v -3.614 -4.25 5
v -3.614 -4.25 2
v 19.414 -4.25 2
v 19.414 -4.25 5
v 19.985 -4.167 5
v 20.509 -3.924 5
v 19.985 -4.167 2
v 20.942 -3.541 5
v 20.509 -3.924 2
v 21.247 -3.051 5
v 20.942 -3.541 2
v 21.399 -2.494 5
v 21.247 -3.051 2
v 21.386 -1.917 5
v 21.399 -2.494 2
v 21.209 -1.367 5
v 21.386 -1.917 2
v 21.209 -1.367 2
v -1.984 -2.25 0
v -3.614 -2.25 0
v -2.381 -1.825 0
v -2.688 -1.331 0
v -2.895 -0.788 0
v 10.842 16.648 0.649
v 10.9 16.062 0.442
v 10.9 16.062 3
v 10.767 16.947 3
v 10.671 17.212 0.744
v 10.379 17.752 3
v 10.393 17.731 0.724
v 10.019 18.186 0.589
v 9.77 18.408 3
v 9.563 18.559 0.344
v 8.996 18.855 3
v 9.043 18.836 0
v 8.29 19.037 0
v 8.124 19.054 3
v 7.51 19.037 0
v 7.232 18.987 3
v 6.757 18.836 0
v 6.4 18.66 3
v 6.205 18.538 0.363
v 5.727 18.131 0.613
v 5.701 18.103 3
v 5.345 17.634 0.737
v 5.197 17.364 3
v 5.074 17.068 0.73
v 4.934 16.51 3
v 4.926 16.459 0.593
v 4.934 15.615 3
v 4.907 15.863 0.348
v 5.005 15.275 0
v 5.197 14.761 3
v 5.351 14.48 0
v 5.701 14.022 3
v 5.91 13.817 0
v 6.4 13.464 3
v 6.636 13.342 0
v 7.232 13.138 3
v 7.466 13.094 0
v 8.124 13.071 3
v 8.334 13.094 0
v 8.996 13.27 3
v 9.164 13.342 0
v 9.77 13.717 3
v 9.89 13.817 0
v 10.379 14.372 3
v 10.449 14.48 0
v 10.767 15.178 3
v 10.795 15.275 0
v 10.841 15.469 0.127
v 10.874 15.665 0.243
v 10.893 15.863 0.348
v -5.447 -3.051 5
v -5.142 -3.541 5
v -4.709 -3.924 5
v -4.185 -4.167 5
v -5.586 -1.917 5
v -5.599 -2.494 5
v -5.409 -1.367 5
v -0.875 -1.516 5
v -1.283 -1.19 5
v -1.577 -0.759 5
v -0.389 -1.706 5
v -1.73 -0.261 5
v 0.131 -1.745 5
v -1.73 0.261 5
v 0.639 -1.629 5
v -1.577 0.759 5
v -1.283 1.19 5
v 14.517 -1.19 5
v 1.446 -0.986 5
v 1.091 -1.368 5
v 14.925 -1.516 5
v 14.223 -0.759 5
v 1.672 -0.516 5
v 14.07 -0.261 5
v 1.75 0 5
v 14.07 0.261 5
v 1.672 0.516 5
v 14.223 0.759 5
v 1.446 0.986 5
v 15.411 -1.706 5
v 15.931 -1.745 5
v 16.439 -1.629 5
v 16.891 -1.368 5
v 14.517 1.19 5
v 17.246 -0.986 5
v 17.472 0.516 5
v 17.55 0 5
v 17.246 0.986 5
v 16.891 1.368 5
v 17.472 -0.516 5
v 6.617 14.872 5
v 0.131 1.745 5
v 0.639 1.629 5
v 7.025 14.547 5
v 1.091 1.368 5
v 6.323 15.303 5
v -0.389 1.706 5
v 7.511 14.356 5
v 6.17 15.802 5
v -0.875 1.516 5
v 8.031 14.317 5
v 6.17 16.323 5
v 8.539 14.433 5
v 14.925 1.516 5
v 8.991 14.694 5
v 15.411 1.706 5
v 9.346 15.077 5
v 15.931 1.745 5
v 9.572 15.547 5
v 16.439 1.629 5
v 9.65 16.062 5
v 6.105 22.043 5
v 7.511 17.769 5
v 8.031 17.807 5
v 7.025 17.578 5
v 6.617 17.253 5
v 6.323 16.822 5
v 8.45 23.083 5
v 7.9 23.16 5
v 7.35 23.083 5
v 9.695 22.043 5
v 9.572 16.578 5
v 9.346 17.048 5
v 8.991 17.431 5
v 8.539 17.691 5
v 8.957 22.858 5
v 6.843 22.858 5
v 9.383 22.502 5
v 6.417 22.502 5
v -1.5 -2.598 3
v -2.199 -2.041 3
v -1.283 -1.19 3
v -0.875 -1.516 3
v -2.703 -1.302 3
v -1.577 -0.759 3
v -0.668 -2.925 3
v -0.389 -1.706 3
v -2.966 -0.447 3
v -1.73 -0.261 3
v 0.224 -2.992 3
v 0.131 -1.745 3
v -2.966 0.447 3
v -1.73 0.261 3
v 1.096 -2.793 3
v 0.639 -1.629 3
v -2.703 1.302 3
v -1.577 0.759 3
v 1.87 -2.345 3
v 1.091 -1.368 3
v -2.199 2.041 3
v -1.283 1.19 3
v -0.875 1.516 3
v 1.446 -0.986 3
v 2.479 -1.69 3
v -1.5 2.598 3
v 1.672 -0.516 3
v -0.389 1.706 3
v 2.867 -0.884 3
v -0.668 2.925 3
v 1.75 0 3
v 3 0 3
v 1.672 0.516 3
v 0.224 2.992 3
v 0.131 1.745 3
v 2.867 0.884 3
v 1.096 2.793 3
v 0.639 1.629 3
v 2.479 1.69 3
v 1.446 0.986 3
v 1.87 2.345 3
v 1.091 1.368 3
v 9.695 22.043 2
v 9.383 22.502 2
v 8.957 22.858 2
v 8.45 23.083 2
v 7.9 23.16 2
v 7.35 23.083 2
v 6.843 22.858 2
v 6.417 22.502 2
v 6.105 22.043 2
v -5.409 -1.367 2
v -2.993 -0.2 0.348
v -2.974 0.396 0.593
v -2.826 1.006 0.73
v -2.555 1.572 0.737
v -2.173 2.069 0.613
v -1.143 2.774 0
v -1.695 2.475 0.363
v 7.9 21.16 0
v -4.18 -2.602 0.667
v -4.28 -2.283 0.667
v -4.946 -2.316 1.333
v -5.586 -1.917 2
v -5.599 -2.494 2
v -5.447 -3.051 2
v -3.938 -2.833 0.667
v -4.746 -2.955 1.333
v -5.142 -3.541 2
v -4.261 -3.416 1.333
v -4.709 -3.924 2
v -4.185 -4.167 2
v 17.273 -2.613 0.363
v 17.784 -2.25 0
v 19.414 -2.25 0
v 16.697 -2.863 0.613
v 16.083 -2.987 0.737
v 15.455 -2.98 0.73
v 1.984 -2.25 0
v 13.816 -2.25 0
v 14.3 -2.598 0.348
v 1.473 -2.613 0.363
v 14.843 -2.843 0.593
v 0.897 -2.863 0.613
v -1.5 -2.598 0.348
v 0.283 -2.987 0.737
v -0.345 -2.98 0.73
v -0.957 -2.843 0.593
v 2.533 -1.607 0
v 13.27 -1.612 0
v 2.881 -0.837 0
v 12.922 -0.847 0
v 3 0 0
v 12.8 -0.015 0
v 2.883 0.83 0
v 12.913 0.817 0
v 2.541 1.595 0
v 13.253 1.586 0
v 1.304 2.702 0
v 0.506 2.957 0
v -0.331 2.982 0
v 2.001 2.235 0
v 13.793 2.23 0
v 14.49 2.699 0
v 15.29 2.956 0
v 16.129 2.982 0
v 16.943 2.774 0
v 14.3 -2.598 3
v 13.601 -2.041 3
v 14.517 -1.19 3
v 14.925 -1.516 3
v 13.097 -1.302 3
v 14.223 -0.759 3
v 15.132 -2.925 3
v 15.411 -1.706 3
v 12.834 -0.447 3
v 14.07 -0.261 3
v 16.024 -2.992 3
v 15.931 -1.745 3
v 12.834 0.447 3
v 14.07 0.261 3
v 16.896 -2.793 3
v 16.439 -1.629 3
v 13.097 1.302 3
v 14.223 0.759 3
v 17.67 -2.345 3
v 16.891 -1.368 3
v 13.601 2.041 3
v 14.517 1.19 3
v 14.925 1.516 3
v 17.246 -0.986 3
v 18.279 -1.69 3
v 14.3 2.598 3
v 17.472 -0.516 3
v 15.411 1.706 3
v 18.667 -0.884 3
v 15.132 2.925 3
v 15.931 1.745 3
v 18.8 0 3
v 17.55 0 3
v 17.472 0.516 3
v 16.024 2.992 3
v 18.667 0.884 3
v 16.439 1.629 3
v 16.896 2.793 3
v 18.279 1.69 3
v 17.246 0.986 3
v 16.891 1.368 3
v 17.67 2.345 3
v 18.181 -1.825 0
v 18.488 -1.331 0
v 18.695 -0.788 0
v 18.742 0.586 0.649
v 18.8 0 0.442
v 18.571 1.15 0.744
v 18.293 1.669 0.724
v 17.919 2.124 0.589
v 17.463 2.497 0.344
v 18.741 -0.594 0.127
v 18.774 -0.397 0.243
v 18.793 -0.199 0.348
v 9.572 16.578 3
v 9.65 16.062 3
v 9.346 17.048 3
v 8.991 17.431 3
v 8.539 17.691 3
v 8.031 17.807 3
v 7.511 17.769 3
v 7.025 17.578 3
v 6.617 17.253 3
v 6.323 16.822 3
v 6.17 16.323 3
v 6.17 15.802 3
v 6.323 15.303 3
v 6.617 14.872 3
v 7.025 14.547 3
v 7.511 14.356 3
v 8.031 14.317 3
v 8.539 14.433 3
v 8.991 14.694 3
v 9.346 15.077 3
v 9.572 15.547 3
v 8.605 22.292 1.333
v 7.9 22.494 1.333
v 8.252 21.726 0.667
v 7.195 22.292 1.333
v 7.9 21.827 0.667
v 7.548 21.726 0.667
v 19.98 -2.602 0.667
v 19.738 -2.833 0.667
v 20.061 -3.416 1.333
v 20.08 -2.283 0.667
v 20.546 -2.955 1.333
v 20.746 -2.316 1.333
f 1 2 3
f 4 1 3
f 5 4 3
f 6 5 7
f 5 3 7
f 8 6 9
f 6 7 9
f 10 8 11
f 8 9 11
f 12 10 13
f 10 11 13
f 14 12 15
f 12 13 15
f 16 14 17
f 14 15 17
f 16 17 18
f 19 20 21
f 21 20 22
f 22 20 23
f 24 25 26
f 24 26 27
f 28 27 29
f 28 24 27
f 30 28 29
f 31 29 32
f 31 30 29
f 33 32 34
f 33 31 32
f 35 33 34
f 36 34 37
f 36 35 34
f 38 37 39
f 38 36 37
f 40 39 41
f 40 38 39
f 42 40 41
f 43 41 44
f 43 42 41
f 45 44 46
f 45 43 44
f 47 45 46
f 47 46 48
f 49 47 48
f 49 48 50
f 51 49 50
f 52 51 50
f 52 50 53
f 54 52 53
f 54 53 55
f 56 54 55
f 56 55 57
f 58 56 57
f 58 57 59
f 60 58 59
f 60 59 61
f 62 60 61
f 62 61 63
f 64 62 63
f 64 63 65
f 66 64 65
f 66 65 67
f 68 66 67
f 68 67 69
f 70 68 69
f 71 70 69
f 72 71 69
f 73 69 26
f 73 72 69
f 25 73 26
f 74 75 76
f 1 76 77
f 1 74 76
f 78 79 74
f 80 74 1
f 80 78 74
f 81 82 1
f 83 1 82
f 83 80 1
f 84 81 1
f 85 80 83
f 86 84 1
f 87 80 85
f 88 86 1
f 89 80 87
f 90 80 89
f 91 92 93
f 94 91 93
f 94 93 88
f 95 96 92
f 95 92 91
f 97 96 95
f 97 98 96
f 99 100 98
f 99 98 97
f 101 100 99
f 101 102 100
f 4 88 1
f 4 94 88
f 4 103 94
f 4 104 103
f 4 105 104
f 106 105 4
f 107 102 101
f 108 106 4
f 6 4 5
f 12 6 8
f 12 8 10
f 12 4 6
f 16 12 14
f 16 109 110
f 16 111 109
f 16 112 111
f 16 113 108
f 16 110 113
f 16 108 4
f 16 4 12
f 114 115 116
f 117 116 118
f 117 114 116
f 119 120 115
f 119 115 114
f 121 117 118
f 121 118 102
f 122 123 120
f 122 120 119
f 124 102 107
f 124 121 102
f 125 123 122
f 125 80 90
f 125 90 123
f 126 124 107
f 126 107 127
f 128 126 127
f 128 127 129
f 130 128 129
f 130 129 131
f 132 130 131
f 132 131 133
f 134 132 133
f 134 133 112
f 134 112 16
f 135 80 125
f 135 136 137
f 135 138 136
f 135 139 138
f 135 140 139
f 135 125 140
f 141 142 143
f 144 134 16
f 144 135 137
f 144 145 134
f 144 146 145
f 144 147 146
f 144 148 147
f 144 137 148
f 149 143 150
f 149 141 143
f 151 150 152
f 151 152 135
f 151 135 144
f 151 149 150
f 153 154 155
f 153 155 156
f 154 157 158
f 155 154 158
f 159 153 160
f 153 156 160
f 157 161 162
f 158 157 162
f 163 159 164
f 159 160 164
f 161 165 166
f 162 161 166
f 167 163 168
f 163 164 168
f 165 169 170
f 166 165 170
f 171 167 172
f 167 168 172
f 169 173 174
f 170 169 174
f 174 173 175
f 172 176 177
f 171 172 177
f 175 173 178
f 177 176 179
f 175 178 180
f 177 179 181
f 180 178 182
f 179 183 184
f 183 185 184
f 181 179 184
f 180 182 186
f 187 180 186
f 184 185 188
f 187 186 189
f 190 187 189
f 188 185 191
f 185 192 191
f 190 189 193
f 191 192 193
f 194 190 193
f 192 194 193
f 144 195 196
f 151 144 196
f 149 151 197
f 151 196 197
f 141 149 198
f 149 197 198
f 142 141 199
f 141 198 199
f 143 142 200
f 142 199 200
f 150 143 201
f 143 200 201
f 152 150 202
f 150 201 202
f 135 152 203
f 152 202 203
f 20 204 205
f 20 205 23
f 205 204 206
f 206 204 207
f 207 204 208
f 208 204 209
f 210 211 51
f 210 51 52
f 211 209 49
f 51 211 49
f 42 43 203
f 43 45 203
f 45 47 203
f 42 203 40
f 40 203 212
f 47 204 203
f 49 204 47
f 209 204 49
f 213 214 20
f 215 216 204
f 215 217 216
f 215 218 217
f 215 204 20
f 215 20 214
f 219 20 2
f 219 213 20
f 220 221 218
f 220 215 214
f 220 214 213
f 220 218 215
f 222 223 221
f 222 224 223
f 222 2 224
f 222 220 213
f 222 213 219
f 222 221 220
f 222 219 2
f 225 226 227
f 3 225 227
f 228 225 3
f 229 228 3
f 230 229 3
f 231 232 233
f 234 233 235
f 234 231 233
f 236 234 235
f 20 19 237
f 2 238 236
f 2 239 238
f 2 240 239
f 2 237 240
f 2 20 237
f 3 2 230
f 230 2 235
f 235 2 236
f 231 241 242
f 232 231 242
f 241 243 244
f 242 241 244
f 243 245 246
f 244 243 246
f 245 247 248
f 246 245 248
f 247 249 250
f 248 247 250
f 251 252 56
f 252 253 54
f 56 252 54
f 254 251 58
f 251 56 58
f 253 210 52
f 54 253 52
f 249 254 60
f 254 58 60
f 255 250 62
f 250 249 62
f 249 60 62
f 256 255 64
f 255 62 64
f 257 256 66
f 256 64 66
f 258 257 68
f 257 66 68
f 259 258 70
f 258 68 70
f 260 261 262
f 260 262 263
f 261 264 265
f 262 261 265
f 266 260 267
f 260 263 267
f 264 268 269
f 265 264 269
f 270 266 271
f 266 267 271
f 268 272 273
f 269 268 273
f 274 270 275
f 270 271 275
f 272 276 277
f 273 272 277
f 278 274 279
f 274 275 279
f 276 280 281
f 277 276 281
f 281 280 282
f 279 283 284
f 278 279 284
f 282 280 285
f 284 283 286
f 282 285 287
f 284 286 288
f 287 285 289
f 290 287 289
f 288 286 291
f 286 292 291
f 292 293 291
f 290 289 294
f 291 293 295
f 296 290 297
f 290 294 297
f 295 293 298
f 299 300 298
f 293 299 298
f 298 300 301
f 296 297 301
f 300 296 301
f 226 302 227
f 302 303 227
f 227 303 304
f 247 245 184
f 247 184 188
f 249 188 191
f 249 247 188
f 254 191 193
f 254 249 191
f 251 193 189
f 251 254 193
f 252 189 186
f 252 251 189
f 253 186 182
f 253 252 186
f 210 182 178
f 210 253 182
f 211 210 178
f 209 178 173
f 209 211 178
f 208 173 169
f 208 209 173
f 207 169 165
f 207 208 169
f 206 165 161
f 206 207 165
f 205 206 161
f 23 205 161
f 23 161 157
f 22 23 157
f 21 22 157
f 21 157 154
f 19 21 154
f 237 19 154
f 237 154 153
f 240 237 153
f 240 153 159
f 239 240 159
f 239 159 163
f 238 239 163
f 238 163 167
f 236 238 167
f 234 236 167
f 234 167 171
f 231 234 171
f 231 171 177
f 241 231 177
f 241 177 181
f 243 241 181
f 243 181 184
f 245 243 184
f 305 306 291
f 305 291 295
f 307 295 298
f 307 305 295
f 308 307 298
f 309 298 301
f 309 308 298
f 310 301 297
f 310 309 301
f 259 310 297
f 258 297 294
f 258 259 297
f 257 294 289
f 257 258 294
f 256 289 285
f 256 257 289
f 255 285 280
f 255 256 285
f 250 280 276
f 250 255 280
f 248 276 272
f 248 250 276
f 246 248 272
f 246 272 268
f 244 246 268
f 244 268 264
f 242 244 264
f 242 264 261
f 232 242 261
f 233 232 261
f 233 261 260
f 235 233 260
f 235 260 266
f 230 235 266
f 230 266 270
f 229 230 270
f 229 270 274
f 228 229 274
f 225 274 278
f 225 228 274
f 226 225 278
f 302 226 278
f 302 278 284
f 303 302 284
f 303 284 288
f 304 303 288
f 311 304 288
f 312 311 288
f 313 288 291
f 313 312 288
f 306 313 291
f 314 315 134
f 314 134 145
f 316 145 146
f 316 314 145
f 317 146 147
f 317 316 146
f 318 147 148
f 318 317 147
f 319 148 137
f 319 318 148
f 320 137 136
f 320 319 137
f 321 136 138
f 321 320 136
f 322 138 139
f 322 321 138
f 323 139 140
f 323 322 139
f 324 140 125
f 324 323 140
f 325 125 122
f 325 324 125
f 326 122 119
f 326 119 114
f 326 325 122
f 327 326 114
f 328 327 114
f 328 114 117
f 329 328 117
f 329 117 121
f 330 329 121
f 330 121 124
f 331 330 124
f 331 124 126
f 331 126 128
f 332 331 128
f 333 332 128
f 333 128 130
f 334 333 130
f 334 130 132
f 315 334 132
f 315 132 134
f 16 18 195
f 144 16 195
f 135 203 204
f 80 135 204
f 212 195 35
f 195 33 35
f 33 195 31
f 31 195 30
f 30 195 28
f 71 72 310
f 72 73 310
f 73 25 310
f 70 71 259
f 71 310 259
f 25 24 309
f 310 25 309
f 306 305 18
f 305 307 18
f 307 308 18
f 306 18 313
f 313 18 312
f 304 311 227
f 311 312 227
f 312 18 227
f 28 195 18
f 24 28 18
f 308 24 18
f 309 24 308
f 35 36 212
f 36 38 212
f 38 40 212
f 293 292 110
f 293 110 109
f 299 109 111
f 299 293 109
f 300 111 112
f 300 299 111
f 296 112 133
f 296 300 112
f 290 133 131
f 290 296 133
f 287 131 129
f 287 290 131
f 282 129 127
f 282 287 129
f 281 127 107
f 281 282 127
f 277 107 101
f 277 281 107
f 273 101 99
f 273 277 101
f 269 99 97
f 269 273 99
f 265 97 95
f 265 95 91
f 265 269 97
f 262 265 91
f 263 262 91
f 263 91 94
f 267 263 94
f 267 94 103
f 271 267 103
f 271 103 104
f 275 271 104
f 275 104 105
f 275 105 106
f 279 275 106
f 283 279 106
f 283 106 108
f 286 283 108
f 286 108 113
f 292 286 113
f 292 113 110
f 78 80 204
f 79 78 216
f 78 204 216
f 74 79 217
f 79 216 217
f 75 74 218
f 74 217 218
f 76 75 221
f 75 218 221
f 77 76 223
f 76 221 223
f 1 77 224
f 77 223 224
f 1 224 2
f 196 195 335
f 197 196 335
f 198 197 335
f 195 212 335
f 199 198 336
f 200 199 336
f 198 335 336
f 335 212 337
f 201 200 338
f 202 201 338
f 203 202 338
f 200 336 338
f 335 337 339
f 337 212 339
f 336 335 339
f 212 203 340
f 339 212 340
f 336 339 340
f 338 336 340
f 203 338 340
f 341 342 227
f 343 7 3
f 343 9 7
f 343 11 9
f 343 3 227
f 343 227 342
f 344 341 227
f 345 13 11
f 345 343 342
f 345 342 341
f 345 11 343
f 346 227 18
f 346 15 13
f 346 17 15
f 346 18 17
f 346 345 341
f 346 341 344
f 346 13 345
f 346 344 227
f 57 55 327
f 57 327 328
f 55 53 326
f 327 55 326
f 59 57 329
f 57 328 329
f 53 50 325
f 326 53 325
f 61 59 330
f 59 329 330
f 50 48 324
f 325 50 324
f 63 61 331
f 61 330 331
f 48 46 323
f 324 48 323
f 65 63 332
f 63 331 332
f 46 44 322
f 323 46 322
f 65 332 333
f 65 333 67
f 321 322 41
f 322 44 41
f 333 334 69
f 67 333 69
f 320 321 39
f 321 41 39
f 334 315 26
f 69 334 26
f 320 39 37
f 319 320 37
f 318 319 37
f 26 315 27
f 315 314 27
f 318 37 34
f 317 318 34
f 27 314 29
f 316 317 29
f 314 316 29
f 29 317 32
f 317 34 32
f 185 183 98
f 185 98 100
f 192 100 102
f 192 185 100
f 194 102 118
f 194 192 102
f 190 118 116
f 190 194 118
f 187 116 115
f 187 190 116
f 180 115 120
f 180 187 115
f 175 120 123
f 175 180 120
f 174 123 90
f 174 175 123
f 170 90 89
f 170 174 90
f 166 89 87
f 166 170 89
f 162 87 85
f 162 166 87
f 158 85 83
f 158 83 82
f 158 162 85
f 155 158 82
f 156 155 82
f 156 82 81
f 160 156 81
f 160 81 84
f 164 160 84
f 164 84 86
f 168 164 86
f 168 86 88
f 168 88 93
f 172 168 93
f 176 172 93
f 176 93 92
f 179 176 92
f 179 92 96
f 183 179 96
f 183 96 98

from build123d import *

# Parameters (mm, degrees)
F0_R         = 1.75
F1_DEPTH     = 5
F2_R         = 3
F3_DEPTH     = 3
F4_T1_DEPTH  = 23.0280702819
F4_T3_DEPTH  = 26.0887631675
F4_T5_DEPTH  = 26.0887631675
F4_T8_ANGLE  = 116.1894596418
F4_T10_ANGLE = 116.1894596418
F4_T12_ANGLE = 127.6210807165


# Not quite as in the source:
# - a fillet or chamfer that OpenCascade refuses, or shapes differently, is made with other operations: its cross-section is extruded or revolved along the edge and cut away or added


with BuildPart() as f1:
    # F0 (on Top) → F1 (new body)
    with BuildSketch(Plane.XY):
        with BuildLine():
            Line((6.1053208487, 22.0431612343), (-5.4087142923, -1.3673184358))
            ThreePointArc((-5.4087142923, -1.3673184358), (-5.3118812954, -3.3070328452), (-3.6140351409, -4.25))
            Line((-3.6140351409, -4.25), (19.4140351409, -4.25))
            ThreePointArc((19.4140351409, -4.25), (21.1118812954, -3.3070328452), (21.2087142923, -1.3673184358))
            Line((21.2087142923, -1.3673184358), (9.6946791513, 22.0431612343))
            ThreePointArc((9.6946791513, 22.0431612343), (7.9, 23.16047967), (6.1053208487, 22.0431612343))
        make_face()
        Circle(F0_R, mode=Mode.SUBTRACT)
        with Locations((15.8, 0)):
            Circle(F0_R, mode=Mode.SUBTRACT)
        with Locations((7.9, 16.0623784042)):
            Circle(F0_R, mode=Mode.SUBTRACT)
    extrude(amount=F1_DEPTH)

    # F2 (on Top) → F3 (cut)
    with BuildSketch(Plane.XY):
        with Locations((15.8, 0)):
            Circle(F2_R)
        Circle(F2_R)
        with Locations((7.9, 16.0623784042)):
            Circle(F2_R)
    extrude(amount=F3_DEPTH, mode=Mode.SUBTRACT)

    # F4: chamfer of 2 on 1 edges, made by hand

    # F4_s2 → F4_t1 (cut)
    with BuildSketch(Plane.YZ.offset(-3.6140351409)):
        Polygon((-2.25, 0), (-4.25, 2), (-4.25, 0), align=None)
    extrude(amount=F4_T1_DEPTH, mode=Mode.SUBTRACT)

    # F4_s4 → F4_t3 (cut)
    with BuildSketch(Plane(origin=(4.672571734, -9.5003310521, 0), x_dir=(0, 0, 1), z_dir=(-0.4413407821, 0.8973395757, 0))):
        Polygon((2, 18.4279652953), (0, 16.4279652953), (0, 18.4279652953), align=None)
    extrude(amount=F4_T3_DEPTH, mode=Mode.SUBTRACT)

    # F4_s6 → F4_t5 (cut)
    with BuildSketch(Plane(origin=(9.9190140452, 20.1674629103, 0), x_dir=(0, 0, 1), z_dir=(-0.4413407821, -0.8973395757, 0))):
        Polygon((2, 4.25), (0, 2.25), (0, 4.25), align=None)
    extrude(amount=F4_T5_DEPTH, mode=Mode.SUBTRACT)

    # F4_s7 → F4_t8 (revolve, cut)
    with BuildSketch(Plane(origin=(-1.5950210957, -3.2430167598, 0), x_dir=(0, 0, 1), z_dir=(0.4413407821, 0.8973395757, 0))):
        Polygon((0, -2.25), (2, -4.25), (0, -4.25), align=None)
    revolve(axis=Axis((-3.6140351409, -2.25, 0), (0, 0, 1)), revolution_arc=F4_T8_ANGLE, mode=Mode.SUBTRACT)

    # F4_s9 → F4_t10 (revolve, cut)
    with BuildSketch(Plane.YZ.offset(19.4140351409)):
        Polygon((-2.25, 0), (-4.25, 2), (-4.25, 0), align=None)
    revolve(axis=Axis((19.4140351409, -2.25, 0), (0, 0, 1)), revolution_arc=F4_T10_ANGLE, mode=Mode.SUBTRACT)

    # F4_s11 → F4_t12 (revolve, cut)
    with BuildSketch(Plane(origin=(-6.841463407, 13.9101486179, 0), x_dir=(0, 0, 1), z_dir=(0.4413407821, -0.8973395757, 0))):
        Polygon((2, -18.4279652953), (0, -16.4279652953), (0, -18.4279652953), align=None)
    revolve(axis=Axis((7.9, 21.16047967, 0), (0, 0, 1)), revolution_arc=F4_T12_ANGLE, mode=Mode.SUBTRACT)


solid = f1.part
